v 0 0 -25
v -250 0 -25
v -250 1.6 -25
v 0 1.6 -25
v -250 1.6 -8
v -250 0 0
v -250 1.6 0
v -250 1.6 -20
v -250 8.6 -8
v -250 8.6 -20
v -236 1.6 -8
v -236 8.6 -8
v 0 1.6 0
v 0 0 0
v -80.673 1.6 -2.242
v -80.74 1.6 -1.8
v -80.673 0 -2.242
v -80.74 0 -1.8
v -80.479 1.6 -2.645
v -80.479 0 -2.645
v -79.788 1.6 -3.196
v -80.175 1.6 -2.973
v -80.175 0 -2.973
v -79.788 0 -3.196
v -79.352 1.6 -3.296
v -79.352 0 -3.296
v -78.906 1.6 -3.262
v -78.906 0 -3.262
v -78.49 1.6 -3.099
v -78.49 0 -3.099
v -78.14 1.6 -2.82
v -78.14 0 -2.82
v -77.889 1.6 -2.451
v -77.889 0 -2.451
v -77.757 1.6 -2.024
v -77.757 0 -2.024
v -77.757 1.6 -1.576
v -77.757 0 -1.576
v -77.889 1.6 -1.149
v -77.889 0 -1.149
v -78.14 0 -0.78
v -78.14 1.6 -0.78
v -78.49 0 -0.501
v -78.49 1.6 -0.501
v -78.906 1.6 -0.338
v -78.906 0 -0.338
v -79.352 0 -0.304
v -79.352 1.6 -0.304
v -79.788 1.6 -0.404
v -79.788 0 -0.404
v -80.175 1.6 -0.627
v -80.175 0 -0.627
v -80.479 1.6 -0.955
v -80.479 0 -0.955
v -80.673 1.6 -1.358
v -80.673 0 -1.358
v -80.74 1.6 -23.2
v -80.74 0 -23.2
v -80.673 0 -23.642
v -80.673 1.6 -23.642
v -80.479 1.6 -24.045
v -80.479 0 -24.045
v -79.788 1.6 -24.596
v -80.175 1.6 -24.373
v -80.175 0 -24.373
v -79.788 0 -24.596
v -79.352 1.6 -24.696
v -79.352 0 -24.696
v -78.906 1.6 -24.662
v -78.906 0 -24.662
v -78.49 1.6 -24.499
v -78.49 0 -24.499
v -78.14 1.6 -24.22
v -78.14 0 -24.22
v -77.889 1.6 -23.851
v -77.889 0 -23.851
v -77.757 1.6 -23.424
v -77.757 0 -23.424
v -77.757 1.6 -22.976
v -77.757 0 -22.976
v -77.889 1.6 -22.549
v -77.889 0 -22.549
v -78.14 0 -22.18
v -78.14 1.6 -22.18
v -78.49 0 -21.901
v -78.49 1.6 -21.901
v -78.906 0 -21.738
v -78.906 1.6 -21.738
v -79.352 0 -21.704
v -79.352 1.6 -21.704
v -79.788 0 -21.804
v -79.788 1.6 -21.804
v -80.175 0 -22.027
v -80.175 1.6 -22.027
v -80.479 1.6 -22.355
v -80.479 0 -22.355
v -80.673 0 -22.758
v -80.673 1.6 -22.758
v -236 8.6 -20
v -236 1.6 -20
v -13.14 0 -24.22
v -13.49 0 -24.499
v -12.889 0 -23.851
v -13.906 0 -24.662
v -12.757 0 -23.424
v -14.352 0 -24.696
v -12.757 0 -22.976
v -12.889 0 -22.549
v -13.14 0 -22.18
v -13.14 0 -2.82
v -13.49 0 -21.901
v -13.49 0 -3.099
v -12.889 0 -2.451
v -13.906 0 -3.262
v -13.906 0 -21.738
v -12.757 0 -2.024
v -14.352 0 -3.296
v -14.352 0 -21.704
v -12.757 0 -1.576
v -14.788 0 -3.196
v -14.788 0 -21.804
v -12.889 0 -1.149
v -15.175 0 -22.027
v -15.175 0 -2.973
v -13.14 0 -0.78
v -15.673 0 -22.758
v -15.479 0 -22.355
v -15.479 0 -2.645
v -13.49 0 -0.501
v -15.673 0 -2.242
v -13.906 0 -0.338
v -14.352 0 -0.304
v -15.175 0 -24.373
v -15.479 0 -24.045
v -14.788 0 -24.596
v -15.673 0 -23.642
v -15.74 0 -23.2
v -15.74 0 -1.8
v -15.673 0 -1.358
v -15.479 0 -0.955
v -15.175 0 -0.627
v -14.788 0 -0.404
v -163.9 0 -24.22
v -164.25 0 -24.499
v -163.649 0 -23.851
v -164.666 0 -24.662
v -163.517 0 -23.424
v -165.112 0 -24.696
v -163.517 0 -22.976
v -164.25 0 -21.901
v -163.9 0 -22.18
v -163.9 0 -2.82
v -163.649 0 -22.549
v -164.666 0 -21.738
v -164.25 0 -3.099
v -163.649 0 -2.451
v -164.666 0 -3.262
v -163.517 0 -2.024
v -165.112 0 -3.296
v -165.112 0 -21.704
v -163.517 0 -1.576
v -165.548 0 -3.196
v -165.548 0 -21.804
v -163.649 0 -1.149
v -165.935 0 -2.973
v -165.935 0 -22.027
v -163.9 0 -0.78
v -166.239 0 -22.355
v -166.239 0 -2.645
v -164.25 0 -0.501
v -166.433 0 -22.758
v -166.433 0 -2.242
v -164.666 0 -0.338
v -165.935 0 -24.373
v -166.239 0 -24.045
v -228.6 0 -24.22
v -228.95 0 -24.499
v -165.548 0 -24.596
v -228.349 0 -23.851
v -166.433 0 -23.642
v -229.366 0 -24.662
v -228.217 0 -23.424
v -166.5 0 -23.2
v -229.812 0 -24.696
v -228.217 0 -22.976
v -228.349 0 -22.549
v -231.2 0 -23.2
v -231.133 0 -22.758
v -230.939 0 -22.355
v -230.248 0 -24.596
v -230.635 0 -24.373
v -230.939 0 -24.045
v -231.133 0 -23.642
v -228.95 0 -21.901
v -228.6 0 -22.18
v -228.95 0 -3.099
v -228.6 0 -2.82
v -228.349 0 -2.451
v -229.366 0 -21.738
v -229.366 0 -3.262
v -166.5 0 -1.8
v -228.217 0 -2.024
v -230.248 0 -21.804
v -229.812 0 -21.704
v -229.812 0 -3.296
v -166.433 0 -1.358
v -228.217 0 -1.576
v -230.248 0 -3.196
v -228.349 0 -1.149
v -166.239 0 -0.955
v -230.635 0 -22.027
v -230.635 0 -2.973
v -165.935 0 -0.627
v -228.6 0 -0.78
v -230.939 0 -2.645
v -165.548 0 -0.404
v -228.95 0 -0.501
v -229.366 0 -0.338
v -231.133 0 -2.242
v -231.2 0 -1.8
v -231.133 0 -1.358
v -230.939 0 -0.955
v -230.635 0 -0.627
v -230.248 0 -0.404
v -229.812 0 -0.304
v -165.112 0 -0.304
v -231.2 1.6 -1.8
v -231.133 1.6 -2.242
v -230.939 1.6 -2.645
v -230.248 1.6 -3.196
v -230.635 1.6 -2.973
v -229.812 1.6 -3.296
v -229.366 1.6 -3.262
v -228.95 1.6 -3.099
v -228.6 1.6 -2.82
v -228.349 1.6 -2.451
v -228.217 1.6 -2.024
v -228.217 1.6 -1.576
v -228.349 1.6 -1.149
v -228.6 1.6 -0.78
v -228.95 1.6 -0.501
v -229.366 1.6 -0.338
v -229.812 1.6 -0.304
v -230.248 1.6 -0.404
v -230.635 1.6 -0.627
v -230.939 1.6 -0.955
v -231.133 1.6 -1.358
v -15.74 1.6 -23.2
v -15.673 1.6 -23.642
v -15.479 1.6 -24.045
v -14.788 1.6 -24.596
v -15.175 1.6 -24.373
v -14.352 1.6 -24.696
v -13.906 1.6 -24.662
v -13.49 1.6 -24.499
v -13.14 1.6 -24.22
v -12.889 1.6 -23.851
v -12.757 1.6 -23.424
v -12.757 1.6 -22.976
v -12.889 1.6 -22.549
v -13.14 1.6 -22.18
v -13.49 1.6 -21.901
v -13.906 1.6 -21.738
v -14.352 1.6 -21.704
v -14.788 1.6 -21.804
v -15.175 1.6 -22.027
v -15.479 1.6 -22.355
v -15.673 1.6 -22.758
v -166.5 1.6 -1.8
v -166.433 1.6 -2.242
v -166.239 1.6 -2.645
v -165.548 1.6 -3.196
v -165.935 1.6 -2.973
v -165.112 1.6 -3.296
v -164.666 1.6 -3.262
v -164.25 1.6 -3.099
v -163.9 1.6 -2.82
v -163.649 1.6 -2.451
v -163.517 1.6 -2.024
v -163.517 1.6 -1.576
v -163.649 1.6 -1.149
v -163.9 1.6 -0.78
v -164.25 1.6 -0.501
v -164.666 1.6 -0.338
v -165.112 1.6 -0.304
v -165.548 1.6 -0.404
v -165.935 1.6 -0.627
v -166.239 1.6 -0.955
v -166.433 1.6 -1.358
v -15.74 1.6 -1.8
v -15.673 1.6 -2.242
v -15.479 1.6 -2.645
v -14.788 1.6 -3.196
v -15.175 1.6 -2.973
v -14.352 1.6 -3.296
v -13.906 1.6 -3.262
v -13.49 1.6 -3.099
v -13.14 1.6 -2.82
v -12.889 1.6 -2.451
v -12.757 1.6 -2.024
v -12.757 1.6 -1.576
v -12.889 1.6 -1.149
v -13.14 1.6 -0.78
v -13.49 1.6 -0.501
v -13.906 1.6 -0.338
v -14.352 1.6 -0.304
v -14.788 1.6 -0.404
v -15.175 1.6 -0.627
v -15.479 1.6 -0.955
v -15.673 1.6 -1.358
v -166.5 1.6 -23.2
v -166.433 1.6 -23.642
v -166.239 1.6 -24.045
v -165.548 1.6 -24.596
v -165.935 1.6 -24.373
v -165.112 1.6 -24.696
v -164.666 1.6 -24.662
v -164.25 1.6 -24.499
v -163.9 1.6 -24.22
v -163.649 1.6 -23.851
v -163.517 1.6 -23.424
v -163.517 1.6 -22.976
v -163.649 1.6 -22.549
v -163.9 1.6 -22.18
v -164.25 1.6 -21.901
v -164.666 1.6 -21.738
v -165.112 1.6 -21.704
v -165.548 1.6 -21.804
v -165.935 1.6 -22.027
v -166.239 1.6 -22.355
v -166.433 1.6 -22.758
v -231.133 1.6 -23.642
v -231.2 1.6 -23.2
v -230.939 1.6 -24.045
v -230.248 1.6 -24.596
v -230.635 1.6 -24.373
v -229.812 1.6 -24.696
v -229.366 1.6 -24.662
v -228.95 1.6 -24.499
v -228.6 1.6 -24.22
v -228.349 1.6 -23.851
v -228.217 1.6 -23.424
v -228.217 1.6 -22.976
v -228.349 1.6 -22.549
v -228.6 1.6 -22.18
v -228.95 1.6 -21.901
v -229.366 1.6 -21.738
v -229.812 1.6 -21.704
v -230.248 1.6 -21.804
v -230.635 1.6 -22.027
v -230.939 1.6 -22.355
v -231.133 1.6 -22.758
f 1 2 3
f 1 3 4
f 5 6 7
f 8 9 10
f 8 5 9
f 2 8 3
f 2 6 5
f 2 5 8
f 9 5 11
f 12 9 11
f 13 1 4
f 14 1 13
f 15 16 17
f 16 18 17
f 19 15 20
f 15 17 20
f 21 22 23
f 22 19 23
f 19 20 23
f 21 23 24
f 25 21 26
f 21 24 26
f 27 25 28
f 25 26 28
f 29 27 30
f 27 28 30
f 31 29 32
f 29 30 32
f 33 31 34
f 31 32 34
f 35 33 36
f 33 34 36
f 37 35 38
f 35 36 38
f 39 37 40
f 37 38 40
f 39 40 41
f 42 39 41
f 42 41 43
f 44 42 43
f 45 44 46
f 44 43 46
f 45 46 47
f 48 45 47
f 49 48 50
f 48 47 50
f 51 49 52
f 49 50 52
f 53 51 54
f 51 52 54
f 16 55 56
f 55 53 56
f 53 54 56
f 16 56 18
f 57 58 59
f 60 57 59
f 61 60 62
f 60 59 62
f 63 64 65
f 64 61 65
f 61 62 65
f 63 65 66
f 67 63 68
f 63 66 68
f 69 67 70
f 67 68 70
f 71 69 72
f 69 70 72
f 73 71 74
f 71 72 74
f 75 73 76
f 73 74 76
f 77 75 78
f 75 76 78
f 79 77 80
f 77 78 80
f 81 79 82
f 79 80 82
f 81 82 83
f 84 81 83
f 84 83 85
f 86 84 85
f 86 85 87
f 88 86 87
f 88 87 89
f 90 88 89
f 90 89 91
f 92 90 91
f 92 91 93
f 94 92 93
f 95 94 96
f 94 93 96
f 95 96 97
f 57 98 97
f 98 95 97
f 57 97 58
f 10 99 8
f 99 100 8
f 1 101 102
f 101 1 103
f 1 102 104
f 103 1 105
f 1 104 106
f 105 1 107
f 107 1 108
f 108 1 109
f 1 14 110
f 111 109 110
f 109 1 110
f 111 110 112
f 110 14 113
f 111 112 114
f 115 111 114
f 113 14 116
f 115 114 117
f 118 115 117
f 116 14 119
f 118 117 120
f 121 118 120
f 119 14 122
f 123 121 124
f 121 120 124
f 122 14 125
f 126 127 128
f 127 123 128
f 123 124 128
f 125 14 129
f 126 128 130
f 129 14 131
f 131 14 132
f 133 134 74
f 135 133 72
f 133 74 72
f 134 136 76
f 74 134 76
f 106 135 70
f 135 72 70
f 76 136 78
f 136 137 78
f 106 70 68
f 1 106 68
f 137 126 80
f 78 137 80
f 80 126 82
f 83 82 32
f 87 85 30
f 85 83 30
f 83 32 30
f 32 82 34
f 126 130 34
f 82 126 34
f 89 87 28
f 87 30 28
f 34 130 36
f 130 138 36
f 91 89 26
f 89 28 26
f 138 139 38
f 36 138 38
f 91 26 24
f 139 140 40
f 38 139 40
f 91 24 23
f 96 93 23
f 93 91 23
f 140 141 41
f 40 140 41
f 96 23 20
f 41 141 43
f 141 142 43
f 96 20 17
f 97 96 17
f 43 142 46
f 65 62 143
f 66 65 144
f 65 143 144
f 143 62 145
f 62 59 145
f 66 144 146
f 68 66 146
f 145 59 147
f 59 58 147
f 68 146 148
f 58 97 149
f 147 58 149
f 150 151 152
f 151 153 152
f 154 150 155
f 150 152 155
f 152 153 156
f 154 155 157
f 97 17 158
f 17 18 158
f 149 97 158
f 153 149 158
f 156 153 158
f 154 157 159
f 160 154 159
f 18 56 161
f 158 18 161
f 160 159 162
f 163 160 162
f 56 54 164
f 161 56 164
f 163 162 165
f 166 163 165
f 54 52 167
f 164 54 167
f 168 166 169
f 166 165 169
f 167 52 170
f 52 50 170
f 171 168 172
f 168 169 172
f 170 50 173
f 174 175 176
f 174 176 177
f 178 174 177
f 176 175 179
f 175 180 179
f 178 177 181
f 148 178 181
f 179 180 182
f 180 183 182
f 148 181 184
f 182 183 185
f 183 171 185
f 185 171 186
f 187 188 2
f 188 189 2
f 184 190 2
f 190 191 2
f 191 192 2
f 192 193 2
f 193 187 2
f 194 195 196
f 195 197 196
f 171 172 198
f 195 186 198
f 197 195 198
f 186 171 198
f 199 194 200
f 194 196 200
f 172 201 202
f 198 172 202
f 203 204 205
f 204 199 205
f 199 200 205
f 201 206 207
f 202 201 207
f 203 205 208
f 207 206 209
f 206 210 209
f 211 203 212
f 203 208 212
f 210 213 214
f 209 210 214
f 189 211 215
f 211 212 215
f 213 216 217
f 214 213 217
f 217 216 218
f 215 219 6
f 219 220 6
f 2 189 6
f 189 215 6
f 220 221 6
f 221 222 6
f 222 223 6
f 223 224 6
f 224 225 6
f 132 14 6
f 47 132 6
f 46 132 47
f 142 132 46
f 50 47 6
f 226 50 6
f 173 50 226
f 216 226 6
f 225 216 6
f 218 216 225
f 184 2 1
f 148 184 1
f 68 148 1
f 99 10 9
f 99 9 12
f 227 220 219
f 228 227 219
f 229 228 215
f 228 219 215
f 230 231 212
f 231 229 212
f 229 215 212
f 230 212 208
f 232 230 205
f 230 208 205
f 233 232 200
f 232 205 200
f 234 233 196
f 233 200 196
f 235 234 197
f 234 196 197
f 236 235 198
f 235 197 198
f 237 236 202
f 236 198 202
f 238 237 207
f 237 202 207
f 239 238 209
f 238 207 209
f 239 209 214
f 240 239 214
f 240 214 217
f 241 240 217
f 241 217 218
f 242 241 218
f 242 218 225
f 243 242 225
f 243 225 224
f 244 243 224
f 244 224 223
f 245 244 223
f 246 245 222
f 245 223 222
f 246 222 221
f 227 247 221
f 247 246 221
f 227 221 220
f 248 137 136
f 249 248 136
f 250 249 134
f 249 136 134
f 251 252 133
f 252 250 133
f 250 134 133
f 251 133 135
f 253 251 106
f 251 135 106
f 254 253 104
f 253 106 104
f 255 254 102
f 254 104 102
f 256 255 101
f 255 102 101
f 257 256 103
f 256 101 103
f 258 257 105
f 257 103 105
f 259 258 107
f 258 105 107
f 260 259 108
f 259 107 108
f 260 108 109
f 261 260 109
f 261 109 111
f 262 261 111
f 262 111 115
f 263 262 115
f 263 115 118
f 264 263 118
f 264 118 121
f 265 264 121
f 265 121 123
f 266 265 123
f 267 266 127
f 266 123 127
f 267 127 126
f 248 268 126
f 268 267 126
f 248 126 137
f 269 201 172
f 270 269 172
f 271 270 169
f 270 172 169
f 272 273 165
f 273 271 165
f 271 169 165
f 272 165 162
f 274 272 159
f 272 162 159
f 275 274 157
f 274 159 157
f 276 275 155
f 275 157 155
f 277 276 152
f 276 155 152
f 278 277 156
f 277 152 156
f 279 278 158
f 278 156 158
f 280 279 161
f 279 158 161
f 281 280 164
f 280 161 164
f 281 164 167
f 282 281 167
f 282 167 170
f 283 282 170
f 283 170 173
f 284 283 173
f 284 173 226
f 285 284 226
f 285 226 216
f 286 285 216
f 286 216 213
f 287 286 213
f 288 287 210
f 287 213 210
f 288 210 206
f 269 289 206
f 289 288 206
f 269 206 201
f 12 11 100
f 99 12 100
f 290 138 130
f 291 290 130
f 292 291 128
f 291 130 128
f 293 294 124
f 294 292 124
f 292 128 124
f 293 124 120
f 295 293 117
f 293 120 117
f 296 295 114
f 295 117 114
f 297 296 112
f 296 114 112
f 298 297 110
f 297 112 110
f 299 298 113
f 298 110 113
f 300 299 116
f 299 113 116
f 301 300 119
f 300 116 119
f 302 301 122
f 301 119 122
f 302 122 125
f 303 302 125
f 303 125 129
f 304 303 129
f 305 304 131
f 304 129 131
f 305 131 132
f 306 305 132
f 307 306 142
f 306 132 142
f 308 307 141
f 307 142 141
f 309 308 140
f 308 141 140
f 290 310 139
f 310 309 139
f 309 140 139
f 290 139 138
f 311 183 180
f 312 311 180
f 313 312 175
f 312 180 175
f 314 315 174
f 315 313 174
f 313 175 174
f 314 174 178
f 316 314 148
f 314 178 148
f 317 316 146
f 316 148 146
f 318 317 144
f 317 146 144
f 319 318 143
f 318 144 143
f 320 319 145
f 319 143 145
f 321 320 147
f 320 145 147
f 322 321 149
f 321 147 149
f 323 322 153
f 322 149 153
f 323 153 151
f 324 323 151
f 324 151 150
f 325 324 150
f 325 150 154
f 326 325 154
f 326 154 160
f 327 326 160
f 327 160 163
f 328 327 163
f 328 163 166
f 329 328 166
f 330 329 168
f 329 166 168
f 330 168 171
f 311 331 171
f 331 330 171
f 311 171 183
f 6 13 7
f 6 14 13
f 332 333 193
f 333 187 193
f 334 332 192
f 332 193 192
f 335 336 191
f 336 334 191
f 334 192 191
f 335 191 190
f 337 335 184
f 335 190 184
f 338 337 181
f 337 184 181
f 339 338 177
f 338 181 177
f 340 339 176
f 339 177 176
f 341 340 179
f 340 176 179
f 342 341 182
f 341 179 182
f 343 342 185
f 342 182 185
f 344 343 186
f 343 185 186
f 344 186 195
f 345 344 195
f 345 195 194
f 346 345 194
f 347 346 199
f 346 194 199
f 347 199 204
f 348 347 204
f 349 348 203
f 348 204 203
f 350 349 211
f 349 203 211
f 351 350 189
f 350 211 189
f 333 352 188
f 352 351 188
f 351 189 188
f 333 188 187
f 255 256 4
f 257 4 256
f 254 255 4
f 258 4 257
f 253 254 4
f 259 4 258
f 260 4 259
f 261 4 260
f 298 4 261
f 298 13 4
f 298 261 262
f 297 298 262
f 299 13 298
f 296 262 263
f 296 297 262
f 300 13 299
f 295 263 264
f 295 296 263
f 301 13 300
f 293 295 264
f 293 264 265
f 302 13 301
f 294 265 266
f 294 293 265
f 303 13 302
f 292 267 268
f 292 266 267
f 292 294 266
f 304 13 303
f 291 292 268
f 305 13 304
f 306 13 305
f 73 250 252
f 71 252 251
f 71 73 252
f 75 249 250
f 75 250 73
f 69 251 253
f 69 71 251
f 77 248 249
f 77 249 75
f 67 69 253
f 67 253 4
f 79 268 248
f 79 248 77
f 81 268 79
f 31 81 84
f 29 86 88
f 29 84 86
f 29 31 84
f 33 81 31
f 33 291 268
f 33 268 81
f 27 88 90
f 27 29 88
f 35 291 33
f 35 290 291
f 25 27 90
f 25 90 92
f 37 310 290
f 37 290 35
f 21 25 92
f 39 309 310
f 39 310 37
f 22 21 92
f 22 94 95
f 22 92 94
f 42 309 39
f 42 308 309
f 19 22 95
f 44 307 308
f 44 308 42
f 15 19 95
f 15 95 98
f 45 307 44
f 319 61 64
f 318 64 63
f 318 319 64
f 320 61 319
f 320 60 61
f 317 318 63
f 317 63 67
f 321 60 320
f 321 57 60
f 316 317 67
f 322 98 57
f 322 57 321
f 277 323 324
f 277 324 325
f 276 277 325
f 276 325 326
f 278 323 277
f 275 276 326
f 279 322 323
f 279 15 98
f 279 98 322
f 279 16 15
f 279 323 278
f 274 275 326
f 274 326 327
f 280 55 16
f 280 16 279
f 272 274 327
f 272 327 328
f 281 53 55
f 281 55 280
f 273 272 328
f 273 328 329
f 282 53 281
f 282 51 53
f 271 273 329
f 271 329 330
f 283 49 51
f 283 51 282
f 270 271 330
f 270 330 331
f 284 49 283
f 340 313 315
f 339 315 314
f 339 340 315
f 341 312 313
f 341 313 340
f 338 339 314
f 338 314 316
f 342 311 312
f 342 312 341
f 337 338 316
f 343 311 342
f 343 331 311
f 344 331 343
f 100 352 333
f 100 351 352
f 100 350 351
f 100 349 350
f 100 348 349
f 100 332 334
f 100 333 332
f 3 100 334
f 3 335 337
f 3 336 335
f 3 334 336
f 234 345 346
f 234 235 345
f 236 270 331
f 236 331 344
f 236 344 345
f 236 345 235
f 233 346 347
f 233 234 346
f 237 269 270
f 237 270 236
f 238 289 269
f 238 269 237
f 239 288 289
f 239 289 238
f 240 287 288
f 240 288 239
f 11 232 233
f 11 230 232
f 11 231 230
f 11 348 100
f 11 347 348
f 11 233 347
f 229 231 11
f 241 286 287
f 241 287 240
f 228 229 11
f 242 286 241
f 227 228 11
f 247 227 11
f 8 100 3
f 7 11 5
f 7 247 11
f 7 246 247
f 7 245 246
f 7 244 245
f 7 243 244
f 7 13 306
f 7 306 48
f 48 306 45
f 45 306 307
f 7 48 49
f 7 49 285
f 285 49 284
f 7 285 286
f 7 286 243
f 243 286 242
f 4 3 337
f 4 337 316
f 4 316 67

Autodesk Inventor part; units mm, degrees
ref_plane "YZ Plane" through (0, 0, 0) normal (1, 0, 0) x (0, 1, 0)
ref_plane "XZ Plane" through (0, 0, 0) normal (0, 1, 0) x (-1, 0, 0)
ref_plane "XY Plane" through (0, 0, 0) normal (0, 0, 1) x (1, 0, 0)
sketch "Esquisse1" plane through (0, 0, 0) normal (0, 1, 0) x (-1, 0, 0)
  line L0 (0, 0) -> (250, 0)
  line L1 (250, 0) -> (250, -25)
  line L2 (250, -25) -> (0, -25)
  line L3 (0, -25) -> (0, 0)
  line L4 (14.24, 0) -> (14.24, -25) construction
  line L5 (0, -12.5) -> (250, -12.5) construction
  circle A0 centre (14.24, -1.8) radius 1.5
  circle A1 centre (14.24, -23.2) radius 1.5
  circle A2 centre (79.24, -1.8) radius 1.5
  circle A3 centre (79.24, -23.2) radius 1.5
  line L6 (229.7, 0) -> (229.7, -25) construction
  circle A4 centre (229.7, -1.8) radius 1.5
  circle A5 centre (229.7, -23.2) radius 1.5
  circle A6 centre (165, -1.8) radius 1.5
  circle A7 centre (165, -23.2) radius 1.5
  dimension "d0" = 25
  dimension "d1" = 250
  dimension "d2" = 1.8
  dimension "d3" = 3
  dimension "d4" = 14.24
  dimension "d7" = 65
  dimension "d12" = 3
  dimension "d13" = 1.8
  dimension "d17" = 64.7
  dimension "d32" = 165
extrude "Extrusion1" add sketch "Esquisse1" along normal blind 1.6
sketch "Esquisse2" plane through (0, 1.6, 0) normal (0, 1, 0) x (1, 0, 0)
  circle A0 centre (-165, 23.2) radius 1.5 construction
  circle A1 centre (-165, 1.8) radius 1.5 construction
  circle A2 centre (-229.7, 23.2) radius 1.5 construction
  circle A3 centre (-229.7, 1.8) radius 1.5 construction
  circle A4 centre (-79.24, 1.8) radius 1.5 construction
  circle A5 centre (-79.24, 23.2) radius 1.5 construction
  circle A6 centre (-14.24, 23.2) radius 1.5 construction
  circle A7 centre (-14.24, 1.8) radius 1.5 construction
  line L0 (-250, 0) -> (0, 0) construction
  line L1 (0, 0) -> (0, 25) construction
  line L2 (0, 25) -> (-250, 25) construction
  line L3 (-250, 25) -> (-250, 0) construction
  line L4 (-250, 8) -> (-236, 8)
  line L5 (-236, 8) -> (-236, 20)
  line L6 (-236, 20) -> (-250, 20)
  line L7 (-250, 20) -> (-250, 8)
  line L8 (-250, 14) -> (-236, 14) construction
  dimension "d24" = 14
  dimension "d25" = 14
  dimension "d26" = 12
extrude "Extrusion2" add sketch "Esquisse2" along normal blind 7
sketch "Esquisse3" plane through (-250, 0, -25) normal (-1, 0, 0) x (0, 0, 1)
  line L0 (25, 0) -> (0, 0) projected
  line L1 (25, 0) -> (25, 1.6) projected
  line L2 (17, 1.6) -> (25, 1.6) projected
  line L3 (17, 1.6) -> (17, 8.6) projected
  line L4 (5, 6.6) -> (17, 6.6) projected
  line L5 (5, 1.6) -> (5, 8.6) projected
  line L6 (0, 1.6) -> (5, 1.6) projected
  line L7 (0, 0) -> (0, 1.6) projected
  line L8 (5, 8.6) -> (17, 8.6) construction
  line L9 (11, 6.6) -> (11, 0) construction
  circle A0 centre (11, 4.1) radius 1.25
  dimension "d29" = 2.5
equation "\"d12\" = d3"
equation "\"d13\" = d2"
properties part number "electronics"
